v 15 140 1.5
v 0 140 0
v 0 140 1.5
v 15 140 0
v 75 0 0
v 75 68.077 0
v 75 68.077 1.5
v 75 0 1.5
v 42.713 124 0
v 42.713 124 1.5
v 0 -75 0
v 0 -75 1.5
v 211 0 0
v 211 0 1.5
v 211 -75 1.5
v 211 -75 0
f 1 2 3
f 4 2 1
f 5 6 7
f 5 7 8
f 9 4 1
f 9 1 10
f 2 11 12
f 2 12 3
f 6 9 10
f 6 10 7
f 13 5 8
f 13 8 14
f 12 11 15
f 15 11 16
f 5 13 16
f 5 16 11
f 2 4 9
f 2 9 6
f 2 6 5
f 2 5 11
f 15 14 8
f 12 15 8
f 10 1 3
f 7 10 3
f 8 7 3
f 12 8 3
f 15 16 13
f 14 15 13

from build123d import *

# Parameters (mm, degrees)
SKETCH1_W           = 211
SKETCH1_H           = 75
BOSS_EXTRUDE1_DEPTH = 1.5
BOSS_EXTRUDE2_DEPTH = 1.5


with BuildPart() as part:
    # Sketch1 → Boss-Extrude1 (new body)
    with BuildSketch(Plane.XY):
        with Locations((105.5, -37.5)):
            Rectangle(SKETCH1_W, SKETCH1_H)
    extrude(amount=BOSS_EXTRUDE1_DEPTH)

    # Sketch2 → Boss-Extrude2 (add)
    with BuildSketch(Plane.XY):
        Polygon((0, 0), (0, 140), (15, 140), (42.712812921, 124), (75, 68.076951546), (75, 0), align=None)
    extrude(amount=BOSS_EXTRUDE2_DEPTH)


solid = part.part
